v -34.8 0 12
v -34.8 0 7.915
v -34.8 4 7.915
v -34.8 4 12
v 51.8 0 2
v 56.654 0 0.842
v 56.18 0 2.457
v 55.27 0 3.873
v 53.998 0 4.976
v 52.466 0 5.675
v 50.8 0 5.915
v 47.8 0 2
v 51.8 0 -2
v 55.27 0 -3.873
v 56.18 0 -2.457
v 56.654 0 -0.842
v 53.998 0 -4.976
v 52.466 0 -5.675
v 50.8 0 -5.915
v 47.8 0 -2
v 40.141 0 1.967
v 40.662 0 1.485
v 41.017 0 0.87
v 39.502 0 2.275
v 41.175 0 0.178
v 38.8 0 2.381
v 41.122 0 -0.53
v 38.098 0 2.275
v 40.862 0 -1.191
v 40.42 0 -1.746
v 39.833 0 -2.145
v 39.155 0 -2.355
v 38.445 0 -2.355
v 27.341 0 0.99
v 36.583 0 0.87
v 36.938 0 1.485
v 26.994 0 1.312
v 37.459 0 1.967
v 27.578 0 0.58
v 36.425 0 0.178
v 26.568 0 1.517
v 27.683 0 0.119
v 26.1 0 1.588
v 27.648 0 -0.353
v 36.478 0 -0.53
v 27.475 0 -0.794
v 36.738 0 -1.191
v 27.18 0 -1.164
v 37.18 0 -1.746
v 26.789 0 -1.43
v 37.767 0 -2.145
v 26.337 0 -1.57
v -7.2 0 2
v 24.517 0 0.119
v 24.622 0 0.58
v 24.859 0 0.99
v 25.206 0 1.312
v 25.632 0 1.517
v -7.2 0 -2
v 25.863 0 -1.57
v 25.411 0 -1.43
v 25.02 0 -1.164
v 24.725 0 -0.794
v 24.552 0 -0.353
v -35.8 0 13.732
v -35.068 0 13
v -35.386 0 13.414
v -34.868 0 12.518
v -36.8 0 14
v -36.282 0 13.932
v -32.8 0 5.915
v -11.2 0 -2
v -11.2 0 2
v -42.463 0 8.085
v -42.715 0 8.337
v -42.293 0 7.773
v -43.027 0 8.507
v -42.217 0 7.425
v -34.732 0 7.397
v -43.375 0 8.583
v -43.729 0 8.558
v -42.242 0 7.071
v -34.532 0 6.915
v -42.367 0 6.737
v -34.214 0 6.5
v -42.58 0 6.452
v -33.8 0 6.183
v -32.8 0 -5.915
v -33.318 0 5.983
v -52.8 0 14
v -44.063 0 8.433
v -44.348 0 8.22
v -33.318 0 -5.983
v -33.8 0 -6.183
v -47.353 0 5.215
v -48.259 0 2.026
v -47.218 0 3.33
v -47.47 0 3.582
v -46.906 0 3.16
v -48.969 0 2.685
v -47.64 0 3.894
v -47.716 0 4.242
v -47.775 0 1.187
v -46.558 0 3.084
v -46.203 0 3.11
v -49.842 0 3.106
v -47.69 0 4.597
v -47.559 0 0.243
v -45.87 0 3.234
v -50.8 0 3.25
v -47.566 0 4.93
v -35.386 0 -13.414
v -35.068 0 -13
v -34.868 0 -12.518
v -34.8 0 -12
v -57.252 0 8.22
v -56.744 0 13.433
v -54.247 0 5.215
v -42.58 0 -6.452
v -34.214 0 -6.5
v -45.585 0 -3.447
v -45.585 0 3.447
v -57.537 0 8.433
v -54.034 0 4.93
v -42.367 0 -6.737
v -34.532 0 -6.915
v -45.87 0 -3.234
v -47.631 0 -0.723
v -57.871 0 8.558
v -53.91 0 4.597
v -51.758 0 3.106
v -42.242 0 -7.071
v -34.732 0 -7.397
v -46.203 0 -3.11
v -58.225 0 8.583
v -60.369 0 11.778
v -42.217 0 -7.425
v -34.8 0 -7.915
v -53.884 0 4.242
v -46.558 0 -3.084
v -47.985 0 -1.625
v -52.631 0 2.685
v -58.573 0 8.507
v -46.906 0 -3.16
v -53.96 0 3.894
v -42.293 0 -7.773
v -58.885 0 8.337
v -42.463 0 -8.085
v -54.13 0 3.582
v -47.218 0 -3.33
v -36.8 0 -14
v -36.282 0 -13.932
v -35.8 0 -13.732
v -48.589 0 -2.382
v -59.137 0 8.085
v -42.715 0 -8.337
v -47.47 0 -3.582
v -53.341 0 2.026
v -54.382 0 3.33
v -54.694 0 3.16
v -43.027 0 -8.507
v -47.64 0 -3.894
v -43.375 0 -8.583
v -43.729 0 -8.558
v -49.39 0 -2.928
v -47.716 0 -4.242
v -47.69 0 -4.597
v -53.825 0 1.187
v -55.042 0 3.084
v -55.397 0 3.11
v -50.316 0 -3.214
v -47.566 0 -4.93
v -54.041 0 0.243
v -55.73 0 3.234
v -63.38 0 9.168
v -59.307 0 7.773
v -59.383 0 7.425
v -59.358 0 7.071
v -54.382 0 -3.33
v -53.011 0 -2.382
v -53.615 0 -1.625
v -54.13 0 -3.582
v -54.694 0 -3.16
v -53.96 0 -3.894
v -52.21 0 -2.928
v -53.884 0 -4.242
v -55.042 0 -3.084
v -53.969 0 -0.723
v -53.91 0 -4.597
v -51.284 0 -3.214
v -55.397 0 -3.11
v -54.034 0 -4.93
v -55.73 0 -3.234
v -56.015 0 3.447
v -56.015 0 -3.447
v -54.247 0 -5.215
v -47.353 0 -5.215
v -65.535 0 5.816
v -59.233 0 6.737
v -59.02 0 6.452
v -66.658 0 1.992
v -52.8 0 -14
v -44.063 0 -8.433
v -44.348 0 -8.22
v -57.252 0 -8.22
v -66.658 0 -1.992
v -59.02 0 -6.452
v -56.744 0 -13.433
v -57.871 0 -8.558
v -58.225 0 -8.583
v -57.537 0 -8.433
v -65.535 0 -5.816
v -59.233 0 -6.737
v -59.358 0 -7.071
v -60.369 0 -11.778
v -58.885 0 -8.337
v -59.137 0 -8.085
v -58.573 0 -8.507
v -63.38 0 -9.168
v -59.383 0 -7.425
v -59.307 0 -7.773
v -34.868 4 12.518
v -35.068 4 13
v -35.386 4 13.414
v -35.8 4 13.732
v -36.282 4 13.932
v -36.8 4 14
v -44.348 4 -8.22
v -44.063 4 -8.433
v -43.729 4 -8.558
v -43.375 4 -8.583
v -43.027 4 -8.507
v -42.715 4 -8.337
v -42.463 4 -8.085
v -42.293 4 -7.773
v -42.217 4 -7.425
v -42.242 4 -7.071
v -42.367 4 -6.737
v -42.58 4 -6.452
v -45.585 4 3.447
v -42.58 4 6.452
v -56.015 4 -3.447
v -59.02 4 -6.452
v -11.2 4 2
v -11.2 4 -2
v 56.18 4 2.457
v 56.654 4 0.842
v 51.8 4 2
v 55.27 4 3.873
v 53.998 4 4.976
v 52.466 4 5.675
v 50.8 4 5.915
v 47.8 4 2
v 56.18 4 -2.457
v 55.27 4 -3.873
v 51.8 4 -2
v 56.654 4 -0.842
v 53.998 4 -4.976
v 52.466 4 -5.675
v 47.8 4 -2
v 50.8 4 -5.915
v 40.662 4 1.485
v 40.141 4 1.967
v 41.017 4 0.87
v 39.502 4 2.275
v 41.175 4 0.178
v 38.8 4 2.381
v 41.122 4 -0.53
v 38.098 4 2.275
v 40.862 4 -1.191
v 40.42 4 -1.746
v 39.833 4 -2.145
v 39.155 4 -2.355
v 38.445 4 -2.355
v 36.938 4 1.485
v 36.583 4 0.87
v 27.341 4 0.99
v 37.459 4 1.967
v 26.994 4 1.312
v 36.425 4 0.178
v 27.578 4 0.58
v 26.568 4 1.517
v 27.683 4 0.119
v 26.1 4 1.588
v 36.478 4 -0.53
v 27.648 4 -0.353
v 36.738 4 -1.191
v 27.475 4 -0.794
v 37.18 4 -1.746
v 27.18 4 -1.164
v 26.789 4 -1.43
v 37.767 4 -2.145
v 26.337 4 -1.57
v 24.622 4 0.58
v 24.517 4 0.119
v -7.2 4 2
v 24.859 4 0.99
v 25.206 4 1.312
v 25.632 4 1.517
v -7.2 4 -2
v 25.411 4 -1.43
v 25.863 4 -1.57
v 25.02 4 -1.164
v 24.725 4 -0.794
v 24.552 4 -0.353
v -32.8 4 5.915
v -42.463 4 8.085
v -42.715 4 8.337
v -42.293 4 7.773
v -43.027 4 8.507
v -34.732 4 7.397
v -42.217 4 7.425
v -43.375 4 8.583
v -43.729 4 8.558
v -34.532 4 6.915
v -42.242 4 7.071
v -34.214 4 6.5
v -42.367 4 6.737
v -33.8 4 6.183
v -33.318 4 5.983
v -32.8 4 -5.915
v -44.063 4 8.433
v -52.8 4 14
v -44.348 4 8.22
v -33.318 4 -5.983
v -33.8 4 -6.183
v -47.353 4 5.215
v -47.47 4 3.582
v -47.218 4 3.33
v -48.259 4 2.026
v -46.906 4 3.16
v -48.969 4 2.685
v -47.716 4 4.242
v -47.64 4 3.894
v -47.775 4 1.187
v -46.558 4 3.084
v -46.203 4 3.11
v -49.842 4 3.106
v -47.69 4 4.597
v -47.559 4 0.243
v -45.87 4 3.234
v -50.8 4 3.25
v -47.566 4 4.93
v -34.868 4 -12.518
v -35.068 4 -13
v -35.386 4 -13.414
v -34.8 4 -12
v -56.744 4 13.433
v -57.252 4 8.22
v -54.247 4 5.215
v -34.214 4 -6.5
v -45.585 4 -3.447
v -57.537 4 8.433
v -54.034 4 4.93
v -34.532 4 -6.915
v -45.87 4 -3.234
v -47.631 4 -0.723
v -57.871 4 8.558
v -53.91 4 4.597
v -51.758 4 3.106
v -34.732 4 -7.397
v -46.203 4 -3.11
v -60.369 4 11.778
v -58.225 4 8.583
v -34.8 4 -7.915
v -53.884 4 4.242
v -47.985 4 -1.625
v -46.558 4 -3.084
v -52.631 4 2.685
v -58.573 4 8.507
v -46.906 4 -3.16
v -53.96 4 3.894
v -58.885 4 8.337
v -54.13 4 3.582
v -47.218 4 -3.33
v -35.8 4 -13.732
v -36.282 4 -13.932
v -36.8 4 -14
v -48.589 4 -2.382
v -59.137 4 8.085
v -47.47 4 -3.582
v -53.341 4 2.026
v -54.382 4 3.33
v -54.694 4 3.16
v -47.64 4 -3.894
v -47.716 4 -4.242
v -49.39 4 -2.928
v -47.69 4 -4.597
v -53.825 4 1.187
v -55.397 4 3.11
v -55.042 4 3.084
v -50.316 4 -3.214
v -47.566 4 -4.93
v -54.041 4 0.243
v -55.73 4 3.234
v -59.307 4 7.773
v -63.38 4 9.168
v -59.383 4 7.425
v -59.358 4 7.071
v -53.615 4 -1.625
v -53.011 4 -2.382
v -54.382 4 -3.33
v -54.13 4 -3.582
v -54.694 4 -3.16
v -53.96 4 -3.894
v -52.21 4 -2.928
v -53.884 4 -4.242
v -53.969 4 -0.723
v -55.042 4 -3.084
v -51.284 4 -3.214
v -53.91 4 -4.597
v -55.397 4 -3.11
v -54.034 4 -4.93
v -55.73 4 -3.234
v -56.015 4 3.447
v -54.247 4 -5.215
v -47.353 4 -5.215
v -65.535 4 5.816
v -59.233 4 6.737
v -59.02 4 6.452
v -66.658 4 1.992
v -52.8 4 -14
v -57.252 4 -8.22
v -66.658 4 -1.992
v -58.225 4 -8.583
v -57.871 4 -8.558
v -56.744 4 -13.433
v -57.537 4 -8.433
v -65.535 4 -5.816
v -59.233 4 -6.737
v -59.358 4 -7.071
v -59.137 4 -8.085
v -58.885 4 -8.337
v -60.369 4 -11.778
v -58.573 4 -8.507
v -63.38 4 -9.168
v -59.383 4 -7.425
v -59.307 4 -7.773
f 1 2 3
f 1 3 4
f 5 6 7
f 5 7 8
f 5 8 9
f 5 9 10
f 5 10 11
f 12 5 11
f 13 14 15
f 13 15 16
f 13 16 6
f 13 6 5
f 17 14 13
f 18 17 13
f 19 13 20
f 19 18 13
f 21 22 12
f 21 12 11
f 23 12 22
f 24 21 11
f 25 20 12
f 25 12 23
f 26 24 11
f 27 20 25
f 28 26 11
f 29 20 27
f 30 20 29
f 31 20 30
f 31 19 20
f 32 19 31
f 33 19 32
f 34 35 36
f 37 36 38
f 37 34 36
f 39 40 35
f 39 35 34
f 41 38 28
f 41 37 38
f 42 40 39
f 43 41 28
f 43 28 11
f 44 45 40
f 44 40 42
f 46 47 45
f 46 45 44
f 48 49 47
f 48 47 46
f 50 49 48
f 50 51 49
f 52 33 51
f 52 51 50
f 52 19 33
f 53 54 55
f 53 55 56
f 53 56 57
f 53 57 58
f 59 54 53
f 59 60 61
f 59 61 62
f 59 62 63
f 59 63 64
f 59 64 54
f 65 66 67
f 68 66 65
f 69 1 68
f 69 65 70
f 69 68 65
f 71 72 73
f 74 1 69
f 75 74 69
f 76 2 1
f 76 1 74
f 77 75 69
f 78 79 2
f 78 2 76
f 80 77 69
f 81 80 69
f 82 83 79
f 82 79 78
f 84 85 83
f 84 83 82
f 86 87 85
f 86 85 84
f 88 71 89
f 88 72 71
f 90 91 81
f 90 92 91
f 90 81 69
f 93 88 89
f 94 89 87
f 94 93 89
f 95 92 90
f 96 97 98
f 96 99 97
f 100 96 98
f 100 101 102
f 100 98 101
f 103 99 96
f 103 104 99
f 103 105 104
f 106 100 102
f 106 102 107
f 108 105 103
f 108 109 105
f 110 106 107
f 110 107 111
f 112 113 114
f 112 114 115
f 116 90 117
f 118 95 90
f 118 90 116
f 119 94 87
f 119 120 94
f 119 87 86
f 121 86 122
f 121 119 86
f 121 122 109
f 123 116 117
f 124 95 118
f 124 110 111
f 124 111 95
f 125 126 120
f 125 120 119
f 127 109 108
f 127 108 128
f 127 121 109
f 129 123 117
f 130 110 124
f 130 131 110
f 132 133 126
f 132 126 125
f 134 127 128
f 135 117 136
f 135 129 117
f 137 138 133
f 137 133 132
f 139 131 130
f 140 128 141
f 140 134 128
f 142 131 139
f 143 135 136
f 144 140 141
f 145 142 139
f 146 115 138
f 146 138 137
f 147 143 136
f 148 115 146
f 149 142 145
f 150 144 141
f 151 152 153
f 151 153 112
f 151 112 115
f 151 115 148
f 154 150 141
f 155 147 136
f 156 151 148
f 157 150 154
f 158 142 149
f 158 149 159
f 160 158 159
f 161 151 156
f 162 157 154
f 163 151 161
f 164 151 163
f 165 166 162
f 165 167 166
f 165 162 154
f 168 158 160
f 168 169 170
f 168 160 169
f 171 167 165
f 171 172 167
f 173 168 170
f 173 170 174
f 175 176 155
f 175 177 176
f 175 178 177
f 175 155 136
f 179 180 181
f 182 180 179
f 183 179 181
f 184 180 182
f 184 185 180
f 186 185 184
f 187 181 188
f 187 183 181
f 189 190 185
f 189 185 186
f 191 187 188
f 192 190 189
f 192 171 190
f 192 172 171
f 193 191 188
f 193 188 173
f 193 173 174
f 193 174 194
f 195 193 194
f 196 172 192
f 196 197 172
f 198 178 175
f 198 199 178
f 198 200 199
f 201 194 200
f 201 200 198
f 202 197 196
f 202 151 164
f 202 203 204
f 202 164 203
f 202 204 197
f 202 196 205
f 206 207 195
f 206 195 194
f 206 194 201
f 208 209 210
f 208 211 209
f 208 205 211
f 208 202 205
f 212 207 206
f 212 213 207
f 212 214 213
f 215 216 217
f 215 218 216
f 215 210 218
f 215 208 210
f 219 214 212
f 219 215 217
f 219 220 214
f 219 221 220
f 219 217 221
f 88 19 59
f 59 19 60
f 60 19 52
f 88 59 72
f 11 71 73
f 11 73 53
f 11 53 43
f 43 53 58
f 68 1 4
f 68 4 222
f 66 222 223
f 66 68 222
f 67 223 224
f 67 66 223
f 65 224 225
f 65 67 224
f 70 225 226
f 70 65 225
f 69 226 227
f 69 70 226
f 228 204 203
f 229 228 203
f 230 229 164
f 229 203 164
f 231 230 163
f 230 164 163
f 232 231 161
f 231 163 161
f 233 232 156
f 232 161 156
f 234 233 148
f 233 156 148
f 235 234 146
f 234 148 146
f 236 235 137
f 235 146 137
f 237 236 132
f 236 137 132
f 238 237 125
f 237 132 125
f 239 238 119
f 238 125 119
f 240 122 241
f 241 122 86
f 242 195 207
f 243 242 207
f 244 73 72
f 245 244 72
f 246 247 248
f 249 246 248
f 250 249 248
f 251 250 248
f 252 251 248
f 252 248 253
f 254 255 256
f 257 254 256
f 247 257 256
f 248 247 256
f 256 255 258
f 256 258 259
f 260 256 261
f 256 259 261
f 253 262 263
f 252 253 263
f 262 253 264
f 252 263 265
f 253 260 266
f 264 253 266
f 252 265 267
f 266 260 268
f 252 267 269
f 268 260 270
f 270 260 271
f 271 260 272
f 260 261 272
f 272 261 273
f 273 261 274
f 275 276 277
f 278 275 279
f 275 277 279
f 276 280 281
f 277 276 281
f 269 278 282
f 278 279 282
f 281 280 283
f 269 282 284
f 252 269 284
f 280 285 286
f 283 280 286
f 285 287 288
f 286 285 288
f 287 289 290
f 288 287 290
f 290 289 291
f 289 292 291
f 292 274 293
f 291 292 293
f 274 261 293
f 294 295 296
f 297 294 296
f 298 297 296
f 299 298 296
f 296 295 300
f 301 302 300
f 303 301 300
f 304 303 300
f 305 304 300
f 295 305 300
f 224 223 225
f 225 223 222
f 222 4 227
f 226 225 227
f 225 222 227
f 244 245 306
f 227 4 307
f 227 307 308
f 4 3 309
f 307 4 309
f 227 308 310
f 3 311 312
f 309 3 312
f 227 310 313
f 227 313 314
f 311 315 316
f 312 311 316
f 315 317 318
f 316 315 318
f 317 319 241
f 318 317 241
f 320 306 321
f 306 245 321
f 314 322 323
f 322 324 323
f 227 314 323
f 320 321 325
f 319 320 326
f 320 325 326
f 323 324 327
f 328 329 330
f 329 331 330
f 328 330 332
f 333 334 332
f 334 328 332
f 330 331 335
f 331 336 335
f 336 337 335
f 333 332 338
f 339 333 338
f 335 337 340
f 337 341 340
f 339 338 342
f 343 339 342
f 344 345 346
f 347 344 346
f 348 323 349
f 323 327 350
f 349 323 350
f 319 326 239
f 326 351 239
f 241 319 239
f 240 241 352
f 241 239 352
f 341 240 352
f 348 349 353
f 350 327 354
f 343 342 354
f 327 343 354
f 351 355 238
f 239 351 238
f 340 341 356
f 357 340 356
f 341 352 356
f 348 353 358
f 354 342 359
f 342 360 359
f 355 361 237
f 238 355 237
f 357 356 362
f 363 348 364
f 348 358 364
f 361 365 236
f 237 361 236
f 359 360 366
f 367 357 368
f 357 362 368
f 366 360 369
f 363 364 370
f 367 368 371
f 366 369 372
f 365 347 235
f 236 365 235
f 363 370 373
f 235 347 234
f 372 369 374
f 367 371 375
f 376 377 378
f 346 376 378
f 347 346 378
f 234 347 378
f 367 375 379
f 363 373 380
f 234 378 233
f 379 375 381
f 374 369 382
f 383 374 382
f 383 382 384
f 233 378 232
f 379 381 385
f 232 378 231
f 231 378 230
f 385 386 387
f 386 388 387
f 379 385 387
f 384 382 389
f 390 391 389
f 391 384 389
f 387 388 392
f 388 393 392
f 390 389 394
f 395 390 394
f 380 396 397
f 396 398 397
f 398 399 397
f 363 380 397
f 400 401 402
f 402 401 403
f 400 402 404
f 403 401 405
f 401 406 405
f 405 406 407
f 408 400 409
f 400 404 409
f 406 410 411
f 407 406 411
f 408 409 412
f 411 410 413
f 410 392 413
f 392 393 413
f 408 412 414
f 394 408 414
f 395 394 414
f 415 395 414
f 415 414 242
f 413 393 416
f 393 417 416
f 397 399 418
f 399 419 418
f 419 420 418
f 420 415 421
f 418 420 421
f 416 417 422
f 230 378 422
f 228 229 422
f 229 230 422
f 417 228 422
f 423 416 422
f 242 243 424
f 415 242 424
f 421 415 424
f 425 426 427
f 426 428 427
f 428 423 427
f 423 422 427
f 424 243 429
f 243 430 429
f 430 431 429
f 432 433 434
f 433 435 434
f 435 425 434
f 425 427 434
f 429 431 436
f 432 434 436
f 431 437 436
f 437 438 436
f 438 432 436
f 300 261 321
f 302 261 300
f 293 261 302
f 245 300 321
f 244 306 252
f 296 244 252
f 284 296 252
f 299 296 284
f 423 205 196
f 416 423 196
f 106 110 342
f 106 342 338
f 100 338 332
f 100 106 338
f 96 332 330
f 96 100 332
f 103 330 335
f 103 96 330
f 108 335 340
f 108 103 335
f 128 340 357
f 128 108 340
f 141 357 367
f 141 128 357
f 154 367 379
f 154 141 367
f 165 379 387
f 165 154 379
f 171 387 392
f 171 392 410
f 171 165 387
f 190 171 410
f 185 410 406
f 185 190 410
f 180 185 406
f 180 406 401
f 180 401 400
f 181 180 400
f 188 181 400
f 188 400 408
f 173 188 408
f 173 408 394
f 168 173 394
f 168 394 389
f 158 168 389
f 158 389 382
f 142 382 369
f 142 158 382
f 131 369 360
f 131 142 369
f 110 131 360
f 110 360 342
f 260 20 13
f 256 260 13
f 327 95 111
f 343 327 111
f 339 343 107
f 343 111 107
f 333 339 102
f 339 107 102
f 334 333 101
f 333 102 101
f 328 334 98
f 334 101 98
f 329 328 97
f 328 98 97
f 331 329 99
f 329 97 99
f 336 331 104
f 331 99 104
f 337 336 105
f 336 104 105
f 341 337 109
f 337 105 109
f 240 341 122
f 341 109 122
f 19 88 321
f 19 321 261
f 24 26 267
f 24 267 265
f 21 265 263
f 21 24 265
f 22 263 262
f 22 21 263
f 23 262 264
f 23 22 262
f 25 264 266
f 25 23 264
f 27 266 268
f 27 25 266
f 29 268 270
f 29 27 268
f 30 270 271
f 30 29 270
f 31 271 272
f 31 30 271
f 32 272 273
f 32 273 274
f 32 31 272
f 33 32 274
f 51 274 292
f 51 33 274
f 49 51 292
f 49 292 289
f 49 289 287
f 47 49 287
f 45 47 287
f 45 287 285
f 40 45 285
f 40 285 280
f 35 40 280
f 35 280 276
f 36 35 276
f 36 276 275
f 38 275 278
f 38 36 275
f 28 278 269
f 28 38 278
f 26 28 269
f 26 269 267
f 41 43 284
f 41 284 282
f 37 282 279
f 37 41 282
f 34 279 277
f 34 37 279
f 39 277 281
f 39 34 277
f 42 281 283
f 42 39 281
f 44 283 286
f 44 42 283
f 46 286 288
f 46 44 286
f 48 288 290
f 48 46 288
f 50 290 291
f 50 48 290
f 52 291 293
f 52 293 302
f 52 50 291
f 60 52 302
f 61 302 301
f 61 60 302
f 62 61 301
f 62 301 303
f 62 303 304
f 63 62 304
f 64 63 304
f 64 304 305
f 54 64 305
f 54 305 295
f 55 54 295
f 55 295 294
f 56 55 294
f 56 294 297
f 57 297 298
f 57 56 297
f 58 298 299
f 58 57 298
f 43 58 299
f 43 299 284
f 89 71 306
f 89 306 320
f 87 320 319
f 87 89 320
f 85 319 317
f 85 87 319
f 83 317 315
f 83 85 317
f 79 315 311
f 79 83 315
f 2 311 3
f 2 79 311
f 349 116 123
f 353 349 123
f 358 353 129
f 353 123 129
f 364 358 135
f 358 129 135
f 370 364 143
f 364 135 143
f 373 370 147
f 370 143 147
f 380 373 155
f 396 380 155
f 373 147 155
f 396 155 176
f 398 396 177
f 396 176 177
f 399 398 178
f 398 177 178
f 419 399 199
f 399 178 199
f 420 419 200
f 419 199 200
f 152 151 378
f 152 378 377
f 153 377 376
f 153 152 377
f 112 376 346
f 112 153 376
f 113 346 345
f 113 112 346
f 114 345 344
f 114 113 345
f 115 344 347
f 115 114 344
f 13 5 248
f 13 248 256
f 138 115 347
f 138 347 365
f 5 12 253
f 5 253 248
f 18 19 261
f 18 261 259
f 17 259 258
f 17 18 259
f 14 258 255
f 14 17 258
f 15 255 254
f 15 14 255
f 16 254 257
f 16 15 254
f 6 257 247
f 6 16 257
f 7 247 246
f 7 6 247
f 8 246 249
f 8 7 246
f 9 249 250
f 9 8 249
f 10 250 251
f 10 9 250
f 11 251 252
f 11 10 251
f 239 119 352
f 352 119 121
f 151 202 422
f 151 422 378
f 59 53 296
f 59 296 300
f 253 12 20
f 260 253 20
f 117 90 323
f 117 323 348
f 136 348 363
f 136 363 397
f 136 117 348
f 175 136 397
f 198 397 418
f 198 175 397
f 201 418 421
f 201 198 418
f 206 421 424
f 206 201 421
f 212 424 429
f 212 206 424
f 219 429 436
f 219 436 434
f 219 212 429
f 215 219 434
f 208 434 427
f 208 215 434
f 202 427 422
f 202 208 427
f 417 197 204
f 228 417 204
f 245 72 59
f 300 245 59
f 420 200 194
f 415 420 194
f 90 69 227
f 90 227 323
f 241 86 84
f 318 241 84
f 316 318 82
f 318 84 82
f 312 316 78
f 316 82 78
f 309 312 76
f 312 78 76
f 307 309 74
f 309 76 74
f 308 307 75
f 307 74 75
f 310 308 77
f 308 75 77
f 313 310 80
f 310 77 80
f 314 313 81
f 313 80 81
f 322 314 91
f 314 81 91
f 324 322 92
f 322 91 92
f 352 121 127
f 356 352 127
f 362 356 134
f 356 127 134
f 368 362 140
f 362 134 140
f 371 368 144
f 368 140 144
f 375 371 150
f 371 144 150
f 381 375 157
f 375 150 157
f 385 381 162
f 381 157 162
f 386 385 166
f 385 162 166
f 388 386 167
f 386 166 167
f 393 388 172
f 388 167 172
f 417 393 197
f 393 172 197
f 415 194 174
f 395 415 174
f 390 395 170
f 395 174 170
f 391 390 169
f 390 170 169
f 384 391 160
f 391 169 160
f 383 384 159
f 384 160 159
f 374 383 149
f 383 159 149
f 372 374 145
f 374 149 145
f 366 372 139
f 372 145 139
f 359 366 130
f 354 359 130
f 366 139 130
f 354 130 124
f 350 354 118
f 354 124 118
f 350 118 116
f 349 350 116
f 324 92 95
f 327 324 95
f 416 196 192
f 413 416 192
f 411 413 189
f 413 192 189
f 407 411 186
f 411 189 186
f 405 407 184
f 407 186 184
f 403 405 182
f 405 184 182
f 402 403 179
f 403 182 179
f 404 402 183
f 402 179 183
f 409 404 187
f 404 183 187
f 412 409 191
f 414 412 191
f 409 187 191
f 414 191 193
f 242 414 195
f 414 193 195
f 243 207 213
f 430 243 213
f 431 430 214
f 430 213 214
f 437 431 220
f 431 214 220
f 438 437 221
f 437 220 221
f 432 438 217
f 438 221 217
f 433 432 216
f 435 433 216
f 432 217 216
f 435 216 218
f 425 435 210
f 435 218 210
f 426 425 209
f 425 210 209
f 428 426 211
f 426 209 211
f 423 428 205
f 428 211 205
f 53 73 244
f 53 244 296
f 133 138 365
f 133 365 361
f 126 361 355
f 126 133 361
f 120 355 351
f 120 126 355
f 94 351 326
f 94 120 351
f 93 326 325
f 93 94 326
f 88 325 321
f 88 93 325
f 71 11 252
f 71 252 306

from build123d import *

# Parameters (mm, degrees)
SKETCH1_R           = 3.25
SKETCH1_R_2         = 2.38125
SKETCH1_R_3         = 1.5875
SKETCH1_W           = 4
SKETCH1_H           = 4
BOSS_EXTRUDE1_DEPTH = 4


with BuildPart() as part:
    # Sketch1 → Boss-Extrude1 (new body)
    with BuildSketch(Plane(origin=(0, 0, 0), x_dir=(1, 0, 0), z_dir=(0, 1, 0))):
        with BuildLine():
            Line((-50.8, 14), (-36.8, 14))
            ThreePointArc((-36.8, 14), (-35.385786438, 13.414213562), (-34.8, 12))
            Line((-34.8, 12), (-34.8, 7.914556152))
            ThreePointArc((-34.8, 7.914556152), (-34.214213562, 6.500342589), (-32.8, 5.914556152))
            Line((-32.8, 5.914556152), (50.8, 5.914556152))
            ThreePointArc((50.8, 5.914556152), (56.714556152, 0), (50.8, -5.914556152))
            Line((50.8, -5.914556152), (-32.8, -5.914556152))
            ThreePointArc((-32.8, -5.914556152), (-34.214213562, -6.500342589), (-34.8, -7.914556152))
            Line((-34.8, -7.914556152), (-34.8, -12))
            ThreePointArc((-34.8, -12), (-35.385786438, -13.414213562), (-36.8, -14))
            Line((-36.8, -14), (-50.8, -14))
            Line((-50.8, -14), (-52.8, -14))
            ThreePointArc((-52.8, -14), (-66.8, 0), (-52.8, 14))
            Line((-52.8, 14), (-50.8, 14))
        make_face()
        with Locations(Location((-50.8, 0, 0), (0, 0, 270))):
            Circle(SKETCH1_R, mode=Mode.SUBTRACT)
        with Locations(Location((38.8, 0, 0), (0, 0, 270))):
            Circle(SKETCH1_R_2, mode=Mode.SUBTRACT)
        with Locations(Location((26.1, 0, 0), (0, 0, 270))):
            Circle(SKETCH1_R_3, mode=Mode.SUBTRACT)
        with BuildLine():
            Line((-57.252349378, 8.220116331), (-54.247145558, 5.214912511))
            ThreePointArc((-54.247145558, 5.214912511), (-54.247145558, 3.447145558), (-56.014912511, 3.447145558))
            Line((-56.014912511, 3.447145558), (-59.020116331, 6.452349378))
            ThreePointArc((-59.020116331, 6.452349378), (-59.020116331, 8.220116331), (-57.252349378, 8.220116331))
        make_face(mode=Mode.SUBTRACT)
        with BuildLine():
            Line((-42.579883669, 6.452349378), (-45.585087489, 3.447145558))
            ThreePointArc((-45.585087489, 3.447145558), (-47.352854442, 3.447145558), (-47.352854442, 5.214912511))
            Line((-47.352854442, 5.214912511), (-44.347650622, 8.220116331))
            ThreePointArc((-44.347650622, 8.220116331), (-42.579883669, 8.220116331), (-42.579883669, 6.452349378))
        make_face(mode=Mode.SUBTRACT)
        with BuildLine():
            Line((-44.347650622, -8.220116331), (-47.352854442, -5.214912511))
            ThreePointArc((-47.352854442, -5.214912511), (-47.352854442, -3.447145558), (-45.585087489, -3.447145558))
            Line((-45.585087489, -3.447145558), (-42.579883669, -6.452349378))
            ThreePointArc((-42.579883669, -6.452349378), (-42.579883669, -8.220116331), (-44.347650622, -8.220116331))
        make_face(mode=Mode.SUBTRACT)
        with BuildLine():
            Line((-59.020116331, -6.452349378), (-56.014912511, -3.447145558))
            ThreePointArc((-56.014912511, -3.447145558), (-54.247145558, -3.447145558), (-54.247145558, -5.214912511))
            Line((-54.247145558, -5.214912511), (-57.252349378, -8.220116331))
            ThreePointArc((-57.252349378, -8.220116331), (-59.020116331, -8.220116331), (-59.020116331, -6.452349378))
        make_face(mode=Mode.SUBTRACT)
        with Locations((49.8, 0)):
            Rectangle(SKETCH1_W, SKETCH1_H, mode=Mode.SUBTRACT)
        with Locations((-9.2, 0)):
            Rectangle(SKETCH1_W, SKETCH1_H, mode=Mode.SUBTRACT)
    extrude(amount=BOSS_EXTRUDE1_DEPTH)


solid = part.part
